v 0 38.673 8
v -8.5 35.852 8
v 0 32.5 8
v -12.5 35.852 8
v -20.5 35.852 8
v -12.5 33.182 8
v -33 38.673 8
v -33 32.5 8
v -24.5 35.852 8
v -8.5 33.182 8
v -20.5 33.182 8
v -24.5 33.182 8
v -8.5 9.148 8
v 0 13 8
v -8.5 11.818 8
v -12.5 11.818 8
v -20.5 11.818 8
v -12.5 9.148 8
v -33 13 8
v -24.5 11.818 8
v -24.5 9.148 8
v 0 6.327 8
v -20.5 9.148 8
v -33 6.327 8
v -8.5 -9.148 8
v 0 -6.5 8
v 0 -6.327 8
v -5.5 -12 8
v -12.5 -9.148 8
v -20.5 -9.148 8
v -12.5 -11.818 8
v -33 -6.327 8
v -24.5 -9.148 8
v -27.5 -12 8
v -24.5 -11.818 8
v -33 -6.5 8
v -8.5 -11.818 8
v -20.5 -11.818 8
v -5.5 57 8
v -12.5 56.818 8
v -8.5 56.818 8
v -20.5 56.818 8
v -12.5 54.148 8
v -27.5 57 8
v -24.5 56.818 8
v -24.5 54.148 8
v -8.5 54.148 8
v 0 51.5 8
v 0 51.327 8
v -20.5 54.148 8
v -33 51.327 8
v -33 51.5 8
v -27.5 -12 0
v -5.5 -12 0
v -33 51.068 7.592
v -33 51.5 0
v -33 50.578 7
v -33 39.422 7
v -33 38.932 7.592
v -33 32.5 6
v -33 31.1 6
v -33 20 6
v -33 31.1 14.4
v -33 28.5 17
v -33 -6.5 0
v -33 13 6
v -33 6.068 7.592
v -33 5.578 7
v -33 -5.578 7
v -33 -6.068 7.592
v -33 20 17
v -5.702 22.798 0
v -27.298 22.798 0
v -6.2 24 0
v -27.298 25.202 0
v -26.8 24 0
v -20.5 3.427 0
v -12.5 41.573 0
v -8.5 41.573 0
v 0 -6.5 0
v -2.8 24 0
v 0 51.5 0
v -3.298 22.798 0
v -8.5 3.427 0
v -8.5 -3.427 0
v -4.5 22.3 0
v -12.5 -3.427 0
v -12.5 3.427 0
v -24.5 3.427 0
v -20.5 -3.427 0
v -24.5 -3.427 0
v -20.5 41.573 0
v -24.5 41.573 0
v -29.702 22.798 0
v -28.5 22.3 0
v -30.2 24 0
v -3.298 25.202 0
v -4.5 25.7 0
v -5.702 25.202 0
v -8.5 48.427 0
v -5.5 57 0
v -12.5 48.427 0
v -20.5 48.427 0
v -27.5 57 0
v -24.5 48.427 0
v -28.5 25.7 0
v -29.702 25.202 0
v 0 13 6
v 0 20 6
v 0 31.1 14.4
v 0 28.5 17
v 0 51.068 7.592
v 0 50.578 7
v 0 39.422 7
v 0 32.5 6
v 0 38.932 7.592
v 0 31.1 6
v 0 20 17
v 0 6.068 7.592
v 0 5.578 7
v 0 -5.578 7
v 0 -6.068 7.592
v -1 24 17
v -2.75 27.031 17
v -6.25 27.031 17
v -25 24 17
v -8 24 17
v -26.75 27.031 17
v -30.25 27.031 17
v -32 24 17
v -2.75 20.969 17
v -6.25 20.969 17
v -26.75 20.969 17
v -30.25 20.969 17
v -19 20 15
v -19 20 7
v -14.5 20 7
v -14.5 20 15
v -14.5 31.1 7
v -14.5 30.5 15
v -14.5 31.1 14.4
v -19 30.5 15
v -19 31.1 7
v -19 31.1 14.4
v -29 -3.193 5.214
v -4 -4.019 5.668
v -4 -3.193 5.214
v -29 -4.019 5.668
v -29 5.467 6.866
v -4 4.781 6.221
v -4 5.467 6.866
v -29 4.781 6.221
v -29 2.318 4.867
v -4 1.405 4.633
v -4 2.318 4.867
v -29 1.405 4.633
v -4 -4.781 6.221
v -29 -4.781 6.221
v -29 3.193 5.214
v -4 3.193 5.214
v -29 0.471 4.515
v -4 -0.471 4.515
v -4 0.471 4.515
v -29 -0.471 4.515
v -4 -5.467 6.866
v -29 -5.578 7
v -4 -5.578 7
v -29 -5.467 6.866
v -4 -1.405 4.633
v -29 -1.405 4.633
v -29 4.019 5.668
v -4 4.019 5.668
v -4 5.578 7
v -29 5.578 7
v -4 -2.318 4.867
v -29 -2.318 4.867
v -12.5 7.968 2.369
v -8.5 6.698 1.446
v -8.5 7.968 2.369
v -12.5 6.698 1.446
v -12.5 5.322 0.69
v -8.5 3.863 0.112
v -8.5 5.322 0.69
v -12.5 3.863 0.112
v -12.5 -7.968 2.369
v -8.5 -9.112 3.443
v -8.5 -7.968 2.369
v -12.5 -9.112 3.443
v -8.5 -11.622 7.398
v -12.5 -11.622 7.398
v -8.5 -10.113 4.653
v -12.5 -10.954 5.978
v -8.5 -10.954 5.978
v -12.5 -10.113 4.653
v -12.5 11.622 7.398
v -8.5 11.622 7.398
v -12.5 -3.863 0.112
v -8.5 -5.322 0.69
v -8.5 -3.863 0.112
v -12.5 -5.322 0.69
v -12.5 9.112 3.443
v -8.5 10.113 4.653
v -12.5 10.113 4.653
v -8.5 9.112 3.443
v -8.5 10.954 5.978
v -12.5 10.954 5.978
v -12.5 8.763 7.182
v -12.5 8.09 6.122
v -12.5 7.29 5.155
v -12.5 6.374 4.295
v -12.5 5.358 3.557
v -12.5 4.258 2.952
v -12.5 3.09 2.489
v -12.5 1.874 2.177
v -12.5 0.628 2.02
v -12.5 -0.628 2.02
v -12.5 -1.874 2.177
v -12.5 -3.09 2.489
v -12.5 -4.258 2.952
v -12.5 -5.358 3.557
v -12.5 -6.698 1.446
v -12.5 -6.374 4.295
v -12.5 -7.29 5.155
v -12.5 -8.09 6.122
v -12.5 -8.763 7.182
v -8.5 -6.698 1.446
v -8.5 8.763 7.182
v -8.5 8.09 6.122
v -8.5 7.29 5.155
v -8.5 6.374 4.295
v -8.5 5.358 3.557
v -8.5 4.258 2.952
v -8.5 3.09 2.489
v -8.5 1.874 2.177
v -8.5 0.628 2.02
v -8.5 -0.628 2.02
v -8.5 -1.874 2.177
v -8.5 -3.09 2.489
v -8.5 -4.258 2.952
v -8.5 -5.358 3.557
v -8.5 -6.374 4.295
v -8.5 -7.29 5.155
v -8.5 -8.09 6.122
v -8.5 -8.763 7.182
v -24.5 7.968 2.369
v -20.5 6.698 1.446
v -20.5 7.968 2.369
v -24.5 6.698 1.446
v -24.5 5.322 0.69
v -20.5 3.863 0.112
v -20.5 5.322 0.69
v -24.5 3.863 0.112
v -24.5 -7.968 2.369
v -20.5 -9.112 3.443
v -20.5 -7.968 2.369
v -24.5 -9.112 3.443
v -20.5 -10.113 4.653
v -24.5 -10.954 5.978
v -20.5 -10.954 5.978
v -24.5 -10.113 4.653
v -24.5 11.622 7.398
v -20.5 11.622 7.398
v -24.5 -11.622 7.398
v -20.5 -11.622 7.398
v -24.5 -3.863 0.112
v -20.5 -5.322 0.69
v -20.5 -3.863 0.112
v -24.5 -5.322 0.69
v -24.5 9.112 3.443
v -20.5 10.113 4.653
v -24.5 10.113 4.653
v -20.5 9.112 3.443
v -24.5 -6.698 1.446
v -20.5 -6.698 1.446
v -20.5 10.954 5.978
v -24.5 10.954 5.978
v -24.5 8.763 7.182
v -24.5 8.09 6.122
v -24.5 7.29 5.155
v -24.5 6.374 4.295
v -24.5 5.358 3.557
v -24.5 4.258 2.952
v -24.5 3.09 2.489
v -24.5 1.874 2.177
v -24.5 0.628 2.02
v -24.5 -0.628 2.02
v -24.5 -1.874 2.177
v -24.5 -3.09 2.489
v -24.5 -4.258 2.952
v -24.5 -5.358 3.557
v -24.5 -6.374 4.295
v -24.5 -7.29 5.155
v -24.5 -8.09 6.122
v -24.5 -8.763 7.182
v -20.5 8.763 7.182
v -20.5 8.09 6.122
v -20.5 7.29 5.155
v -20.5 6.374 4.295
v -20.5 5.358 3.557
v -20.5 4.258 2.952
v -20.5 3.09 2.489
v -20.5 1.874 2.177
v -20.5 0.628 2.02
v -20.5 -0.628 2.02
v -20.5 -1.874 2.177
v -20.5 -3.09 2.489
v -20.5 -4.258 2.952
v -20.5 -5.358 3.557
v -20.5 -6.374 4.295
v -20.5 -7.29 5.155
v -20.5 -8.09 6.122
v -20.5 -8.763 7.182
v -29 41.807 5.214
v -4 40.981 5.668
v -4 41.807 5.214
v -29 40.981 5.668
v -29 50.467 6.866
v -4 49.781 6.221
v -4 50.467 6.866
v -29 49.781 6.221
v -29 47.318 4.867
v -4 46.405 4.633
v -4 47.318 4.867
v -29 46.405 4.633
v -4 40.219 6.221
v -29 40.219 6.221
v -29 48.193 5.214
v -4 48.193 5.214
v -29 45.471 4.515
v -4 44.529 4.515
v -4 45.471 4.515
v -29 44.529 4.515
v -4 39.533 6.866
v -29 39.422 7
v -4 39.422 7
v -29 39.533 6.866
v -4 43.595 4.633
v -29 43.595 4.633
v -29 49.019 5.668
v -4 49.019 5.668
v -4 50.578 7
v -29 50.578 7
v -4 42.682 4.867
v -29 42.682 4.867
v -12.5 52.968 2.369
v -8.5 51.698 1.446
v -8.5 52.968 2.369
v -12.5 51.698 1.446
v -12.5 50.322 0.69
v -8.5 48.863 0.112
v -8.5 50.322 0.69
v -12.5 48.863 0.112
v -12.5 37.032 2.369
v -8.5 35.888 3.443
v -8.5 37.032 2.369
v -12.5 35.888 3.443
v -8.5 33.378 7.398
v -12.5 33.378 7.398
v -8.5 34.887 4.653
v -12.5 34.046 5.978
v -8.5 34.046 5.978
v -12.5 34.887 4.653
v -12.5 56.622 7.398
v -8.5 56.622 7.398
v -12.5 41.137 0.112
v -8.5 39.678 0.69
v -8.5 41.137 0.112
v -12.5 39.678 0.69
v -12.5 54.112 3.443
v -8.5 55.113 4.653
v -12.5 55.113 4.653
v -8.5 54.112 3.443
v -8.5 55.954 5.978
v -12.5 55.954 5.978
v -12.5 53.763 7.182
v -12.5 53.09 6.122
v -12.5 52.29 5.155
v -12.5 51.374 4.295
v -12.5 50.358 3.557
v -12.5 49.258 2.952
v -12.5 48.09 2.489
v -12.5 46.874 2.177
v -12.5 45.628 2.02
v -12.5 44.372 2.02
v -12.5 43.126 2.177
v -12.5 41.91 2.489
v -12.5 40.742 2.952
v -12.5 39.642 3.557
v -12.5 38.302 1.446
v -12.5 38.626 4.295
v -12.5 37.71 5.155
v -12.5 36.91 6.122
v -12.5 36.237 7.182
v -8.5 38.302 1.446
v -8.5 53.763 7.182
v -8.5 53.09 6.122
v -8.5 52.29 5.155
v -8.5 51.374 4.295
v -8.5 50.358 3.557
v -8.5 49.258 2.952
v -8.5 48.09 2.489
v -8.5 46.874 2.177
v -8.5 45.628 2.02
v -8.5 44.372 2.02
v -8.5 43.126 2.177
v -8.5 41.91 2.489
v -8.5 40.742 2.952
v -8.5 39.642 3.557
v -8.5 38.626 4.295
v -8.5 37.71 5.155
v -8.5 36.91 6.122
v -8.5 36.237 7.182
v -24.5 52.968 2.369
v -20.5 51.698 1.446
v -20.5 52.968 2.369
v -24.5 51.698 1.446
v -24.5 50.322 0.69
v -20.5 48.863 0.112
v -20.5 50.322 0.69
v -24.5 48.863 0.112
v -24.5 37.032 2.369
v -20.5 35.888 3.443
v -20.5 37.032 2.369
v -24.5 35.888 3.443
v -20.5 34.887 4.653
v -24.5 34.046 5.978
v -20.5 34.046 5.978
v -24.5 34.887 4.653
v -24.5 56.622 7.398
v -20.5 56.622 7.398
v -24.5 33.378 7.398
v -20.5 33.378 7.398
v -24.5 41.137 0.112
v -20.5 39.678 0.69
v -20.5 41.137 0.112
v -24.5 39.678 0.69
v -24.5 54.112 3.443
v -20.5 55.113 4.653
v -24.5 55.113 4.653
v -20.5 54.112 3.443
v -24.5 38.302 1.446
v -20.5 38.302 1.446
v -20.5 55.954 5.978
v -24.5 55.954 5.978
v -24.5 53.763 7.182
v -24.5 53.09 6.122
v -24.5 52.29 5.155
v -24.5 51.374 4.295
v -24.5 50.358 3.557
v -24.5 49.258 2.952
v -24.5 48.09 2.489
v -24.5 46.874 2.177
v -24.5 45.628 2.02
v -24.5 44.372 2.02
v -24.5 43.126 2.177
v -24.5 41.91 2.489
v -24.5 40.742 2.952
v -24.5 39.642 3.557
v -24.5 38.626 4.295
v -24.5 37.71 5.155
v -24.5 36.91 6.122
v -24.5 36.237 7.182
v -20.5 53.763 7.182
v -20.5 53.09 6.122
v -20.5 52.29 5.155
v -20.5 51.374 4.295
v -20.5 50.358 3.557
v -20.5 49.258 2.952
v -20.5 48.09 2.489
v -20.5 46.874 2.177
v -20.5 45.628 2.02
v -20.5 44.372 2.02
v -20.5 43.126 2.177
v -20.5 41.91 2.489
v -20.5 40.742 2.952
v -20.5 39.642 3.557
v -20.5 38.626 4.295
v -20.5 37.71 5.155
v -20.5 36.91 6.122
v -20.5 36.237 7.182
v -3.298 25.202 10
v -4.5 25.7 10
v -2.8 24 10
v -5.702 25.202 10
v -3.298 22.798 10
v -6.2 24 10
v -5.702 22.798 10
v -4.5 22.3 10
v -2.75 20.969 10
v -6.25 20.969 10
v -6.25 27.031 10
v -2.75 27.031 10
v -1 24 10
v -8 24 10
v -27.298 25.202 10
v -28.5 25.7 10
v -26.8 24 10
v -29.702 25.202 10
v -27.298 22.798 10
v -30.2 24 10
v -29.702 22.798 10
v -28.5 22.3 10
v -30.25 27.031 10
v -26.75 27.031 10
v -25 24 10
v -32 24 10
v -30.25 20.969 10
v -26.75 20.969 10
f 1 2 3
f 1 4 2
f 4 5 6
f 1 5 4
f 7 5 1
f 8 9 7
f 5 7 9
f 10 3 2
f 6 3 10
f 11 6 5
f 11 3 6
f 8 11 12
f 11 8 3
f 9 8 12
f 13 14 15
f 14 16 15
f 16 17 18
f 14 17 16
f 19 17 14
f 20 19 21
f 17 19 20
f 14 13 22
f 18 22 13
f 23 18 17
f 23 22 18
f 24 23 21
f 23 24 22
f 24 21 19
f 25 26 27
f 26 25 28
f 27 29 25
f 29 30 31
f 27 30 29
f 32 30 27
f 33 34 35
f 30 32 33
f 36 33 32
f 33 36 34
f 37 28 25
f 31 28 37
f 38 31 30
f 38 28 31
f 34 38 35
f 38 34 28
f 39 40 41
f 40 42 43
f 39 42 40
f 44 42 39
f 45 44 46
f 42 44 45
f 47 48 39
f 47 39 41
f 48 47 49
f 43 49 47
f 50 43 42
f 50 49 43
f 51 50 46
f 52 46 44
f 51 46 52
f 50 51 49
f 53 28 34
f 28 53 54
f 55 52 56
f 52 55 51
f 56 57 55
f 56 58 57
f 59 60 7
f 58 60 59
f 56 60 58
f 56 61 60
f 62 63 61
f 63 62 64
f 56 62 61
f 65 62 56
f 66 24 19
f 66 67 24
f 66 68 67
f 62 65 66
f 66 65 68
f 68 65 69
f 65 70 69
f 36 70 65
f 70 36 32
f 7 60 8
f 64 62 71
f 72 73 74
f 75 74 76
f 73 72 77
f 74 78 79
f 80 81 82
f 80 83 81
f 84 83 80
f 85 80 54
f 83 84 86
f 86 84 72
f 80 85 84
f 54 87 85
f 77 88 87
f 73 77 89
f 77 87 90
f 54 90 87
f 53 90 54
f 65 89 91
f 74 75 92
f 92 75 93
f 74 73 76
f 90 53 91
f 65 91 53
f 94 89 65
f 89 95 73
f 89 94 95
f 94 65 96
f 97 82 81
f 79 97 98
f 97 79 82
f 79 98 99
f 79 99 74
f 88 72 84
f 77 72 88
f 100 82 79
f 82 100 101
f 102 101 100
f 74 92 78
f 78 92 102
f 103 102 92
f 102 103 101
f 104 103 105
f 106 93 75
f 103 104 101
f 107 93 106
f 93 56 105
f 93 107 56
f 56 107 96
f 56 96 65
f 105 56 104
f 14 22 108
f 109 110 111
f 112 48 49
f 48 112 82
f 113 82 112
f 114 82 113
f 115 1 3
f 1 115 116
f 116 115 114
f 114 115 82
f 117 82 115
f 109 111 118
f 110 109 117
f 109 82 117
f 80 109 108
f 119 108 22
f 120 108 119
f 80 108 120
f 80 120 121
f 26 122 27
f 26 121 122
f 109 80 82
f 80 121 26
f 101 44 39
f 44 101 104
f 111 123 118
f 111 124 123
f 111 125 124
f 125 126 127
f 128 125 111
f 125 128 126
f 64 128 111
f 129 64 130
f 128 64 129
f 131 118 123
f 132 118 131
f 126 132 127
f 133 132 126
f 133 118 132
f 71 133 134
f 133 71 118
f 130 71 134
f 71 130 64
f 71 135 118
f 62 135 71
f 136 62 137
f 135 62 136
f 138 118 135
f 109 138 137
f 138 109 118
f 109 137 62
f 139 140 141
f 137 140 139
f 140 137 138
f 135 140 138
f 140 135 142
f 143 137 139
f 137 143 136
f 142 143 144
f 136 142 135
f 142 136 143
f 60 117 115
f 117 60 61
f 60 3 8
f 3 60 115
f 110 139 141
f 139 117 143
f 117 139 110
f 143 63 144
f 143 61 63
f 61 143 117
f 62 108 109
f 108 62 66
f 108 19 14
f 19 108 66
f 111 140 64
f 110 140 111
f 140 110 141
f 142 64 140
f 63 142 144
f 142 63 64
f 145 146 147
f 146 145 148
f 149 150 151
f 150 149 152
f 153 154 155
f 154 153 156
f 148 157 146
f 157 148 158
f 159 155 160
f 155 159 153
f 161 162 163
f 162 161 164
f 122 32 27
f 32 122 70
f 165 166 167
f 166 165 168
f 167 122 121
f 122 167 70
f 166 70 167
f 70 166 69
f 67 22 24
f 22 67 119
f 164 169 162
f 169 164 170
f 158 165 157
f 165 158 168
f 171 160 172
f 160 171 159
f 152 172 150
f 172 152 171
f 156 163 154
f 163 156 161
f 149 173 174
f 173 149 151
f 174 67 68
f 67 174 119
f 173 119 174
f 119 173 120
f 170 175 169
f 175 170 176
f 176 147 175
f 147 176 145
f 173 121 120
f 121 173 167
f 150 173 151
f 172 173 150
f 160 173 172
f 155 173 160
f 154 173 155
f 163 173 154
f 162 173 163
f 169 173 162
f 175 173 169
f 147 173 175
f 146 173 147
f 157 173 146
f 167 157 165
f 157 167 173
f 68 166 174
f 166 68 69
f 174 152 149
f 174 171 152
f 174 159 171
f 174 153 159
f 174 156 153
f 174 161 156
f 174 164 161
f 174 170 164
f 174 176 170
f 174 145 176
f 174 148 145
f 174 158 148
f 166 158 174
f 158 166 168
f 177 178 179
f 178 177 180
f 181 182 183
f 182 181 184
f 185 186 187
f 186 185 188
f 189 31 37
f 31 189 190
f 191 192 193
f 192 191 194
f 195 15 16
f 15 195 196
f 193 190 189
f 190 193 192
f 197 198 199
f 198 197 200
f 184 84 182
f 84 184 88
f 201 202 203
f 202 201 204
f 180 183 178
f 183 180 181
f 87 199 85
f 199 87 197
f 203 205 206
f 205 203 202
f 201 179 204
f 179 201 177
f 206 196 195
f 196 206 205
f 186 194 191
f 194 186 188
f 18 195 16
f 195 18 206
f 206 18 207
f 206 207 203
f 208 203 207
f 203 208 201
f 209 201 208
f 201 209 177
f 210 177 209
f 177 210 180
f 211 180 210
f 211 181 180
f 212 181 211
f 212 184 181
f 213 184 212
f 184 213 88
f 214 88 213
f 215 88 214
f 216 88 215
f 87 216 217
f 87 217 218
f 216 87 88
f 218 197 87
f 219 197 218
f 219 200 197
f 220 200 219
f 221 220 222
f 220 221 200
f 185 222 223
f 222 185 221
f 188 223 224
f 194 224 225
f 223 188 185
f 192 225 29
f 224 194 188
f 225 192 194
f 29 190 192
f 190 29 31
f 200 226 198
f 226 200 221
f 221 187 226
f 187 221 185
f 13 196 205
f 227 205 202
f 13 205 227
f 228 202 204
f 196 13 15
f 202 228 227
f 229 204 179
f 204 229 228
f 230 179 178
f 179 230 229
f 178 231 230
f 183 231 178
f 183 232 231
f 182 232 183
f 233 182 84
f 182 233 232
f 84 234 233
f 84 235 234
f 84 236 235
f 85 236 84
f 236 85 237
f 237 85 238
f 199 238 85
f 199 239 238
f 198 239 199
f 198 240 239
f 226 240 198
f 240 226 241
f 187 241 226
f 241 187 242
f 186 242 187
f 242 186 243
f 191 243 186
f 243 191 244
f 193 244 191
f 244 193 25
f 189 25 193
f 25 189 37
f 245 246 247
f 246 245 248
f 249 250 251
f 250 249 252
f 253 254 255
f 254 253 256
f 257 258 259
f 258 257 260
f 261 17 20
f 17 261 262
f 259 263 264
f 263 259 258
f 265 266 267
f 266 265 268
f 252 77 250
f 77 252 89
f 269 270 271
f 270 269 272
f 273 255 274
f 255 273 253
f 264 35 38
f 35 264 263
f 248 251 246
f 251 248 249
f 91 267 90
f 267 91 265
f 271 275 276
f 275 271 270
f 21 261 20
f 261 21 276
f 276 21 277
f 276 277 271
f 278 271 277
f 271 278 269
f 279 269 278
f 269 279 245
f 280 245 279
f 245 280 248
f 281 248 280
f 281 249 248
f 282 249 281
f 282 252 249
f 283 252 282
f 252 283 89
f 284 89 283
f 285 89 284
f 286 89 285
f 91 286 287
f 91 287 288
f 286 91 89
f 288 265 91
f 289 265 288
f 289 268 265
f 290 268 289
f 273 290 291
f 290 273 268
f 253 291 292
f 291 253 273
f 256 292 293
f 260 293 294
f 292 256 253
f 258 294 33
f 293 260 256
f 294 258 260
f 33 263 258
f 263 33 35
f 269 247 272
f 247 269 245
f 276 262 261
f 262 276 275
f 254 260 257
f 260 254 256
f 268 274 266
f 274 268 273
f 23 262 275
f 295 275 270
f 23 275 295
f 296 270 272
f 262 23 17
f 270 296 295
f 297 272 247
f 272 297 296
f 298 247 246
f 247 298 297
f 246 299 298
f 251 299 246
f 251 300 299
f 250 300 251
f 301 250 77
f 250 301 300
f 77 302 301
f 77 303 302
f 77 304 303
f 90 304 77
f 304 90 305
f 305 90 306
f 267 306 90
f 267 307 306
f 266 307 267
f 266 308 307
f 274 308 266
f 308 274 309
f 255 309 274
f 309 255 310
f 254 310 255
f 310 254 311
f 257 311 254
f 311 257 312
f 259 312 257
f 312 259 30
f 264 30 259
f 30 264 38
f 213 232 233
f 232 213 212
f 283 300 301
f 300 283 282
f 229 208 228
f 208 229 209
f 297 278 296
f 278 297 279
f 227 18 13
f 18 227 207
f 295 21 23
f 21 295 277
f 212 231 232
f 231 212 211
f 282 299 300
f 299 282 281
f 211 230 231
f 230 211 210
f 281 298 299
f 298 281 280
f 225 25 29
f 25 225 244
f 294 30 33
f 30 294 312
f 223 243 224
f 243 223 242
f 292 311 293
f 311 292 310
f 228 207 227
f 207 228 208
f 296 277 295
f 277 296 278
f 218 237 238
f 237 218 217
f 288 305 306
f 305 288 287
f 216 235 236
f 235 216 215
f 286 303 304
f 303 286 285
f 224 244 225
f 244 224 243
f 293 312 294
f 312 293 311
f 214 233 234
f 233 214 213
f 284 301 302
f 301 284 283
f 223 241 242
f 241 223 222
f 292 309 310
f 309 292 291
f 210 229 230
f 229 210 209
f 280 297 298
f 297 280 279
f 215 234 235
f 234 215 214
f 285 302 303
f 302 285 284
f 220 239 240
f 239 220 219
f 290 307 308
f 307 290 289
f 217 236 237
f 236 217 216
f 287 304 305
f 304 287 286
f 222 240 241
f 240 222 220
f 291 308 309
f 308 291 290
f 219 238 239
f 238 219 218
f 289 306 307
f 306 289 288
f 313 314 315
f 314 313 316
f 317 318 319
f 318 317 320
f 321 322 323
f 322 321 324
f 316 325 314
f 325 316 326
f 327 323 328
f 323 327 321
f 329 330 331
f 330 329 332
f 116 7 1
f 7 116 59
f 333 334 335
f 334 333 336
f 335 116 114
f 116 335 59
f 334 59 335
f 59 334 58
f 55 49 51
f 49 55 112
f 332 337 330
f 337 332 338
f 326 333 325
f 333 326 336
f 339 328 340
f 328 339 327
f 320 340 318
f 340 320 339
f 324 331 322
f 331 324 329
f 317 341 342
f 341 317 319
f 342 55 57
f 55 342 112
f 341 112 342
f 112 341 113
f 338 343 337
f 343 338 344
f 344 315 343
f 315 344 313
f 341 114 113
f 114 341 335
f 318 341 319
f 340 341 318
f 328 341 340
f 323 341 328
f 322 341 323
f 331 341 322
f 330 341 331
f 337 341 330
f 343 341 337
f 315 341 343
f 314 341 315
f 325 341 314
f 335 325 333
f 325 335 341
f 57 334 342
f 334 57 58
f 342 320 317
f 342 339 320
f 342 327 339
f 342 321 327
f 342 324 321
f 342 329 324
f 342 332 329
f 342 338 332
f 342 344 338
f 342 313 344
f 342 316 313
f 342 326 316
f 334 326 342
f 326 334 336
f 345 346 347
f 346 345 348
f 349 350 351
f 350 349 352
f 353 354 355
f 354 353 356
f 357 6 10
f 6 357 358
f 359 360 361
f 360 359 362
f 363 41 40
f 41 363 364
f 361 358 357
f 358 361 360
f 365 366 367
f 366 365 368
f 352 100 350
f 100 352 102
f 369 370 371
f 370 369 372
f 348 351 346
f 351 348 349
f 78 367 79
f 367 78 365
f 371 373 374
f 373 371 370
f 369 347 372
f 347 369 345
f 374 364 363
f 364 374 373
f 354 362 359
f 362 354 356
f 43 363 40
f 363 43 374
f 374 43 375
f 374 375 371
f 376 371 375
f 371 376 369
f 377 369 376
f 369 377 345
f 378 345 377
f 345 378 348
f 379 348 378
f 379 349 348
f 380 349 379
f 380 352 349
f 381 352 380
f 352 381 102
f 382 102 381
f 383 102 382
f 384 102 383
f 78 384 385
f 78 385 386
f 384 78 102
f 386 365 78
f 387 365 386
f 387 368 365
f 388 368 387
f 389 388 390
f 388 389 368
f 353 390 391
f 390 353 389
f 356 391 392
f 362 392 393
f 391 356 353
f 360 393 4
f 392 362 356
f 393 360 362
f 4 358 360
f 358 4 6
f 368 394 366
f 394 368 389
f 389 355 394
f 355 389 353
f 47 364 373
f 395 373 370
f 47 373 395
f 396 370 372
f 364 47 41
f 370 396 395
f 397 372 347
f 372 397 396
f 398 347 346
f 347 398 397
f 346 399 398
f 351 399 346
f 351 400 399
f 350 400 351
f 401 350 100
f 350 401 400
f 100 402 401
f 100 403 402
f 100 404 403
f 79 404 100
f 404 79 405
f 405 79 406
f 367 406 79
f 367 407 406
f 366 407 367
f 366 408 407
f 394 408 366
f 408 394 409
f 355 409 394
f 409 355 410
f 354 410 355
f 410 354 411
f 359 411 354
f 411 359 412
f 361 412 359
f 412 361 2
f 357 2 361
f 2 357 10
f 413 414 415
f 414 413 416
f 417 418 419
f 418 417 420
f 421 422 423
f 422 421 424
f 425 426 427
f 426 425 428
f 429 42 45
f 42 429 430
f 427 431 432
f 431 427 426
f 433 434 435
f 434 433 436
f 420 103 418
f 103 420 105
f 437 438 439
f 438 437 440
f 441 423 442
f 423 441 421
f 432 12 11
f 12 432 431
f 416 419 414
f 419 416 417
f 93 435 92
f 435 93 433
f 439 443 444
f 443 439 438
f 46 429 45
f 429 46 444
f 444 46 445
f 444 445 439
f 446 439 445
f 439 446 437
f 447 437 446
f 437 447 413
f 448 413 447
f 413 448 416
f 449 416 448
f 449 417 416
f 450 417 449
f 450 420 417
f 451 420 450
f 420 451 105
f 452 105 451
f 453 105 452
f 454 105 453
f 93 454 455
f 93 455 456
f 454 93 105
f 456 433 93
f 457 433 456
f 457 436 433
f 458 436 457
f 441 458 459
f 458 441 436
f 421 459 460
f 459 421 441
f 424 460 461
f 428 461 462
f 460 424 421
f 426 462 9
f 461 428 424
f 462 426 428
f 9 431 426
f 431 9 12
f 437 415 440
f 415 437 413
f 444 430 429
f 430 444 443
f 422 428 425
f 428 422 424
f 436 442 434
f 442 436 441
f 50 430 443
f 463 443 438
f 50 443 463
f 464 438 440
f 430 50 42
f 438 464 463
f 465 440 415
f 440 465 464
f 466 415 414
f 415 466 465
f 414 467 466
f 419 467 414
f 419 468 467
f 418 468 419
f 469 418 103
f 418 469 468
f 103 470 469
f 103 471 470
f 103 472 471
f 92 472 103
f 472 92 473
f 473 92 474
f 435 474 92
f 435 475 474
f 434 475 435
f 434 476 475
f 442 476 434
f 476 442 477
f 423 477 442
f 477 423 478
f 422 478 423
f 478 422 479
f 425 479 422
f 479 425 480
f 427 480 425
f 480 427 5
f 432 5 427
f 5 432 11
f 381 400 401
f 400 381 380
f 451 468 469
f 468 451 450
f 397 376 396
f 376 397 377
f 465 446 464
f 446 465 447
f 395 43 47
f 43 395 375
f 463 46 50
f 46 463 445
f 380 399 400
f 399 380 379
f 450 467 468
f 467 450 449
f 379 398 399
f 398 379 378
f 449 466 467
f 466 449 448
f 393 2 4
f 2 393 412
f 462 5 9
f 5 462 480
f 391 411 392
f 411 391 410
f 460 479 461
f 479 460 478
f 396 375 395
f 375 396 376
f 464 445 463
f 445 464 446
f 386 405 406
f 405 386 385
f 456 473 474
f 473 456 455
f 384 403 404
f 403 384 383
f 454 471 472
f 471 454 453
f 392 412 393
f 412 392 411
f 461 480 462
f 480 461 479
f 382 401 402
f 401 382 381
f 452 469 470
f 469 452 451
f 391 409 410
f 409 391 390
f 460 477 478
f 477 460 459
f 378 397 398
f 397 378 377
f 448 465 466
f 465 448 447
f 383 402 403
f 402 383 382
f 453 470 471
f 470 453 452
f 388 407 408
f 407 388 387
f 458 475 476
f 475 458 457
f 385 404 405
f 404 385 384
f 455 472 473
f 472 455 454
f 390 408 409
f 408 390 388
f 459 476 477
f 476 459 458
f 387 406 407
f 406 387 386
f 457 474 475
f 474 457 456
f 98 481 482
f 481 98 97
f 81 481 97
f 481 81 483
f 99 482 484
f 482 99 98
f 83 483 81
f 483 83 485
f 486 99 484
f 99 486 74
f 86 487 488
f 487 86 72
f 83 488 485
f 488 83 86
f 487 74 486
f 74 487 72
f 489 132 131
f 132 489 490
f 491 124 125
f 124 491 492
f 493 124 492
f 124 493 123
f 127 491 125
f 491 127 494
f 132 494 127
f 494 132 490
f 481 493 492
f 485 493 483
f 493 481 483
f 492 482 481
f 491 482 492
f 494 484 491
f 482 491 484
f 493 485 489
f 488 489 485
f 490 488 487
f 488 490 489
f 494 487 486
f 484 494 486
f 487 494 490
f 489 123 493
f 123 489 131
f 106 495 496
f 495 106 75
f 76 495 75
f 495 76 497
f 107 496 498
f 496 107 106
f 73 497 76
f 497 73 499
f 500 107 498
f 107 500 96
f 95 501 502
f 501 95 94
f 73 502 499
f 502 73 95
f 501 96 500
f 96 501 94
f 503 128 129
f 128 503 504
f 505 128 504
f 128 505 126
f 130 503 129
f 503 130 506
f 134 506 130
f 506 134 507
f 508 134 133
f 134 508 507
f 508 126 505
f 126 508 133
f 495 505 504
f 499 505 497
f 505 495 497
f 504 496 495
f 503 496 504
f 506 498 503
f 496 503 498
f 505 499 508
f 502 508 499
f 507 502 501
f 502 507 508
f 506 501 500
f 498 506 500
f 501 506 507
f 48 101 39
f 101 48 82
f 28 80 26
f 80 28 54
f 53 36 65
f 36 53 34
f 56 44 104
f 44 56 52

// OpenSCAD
// file: inc/bearing.scad
// PRUSA iteration3
// Bearing holders
// GNU GPL v3
// Josef Průša <iam@josefprusa.cz> and contributors
// http://www.reprap.org/wiki/Prusa_Mendel
// http://prusamendel.org

bearing_diameter = 15;

module horizontal_bearing_base(bearings=1){
 translate(v=[0,0,8/2]) cube(size = [24,8+bearings*25,8], center = true);	
}
module horizontal_bearing_holes(bearings=1){
 cutter_lenght = 10+bearings*25;
 one_holder_lenght = 8+25;
 holder_lenght = 8+bearings*25;
 
 // Main bearing cut
 difference(){
  translate(v=[0,0,12]) rotate(a=[90,0,0]) translate(v=[0,0,-cutter_lenght/2]) cylinder(h = cutter_lenght, r=bearing_diameter/2, $fn=50);
  // Bearing retainers
  translate(v=[0,1-holder_lenght/2,3]) cube(size = [24,6,8], center = true);
  translate(v=[0,-1+holder_lenght/2,3]) cube(size = [24,6,8], center = true);
 }
 
 // Ziptie cutouts
 ziptie_cut_ofset = 0;
 for ( i = [0 : bearings-1] ){
  // For easier positioning I move them by half of one 
  // bearing holder then add each bearign lenght and then center again
  translate(v=[0,-holder_lenght/2,0]) translate(v=[0,one_holder_lenght/2+i*25,0]) difference(){
   union(){
    translate(v=[0,2-6,12]) rotate(a=[90,0,0]) translate(v=[0,0,0]) cylinder(h = 4, r=12.5, $fn=50);
    translate(v=[0,2+6,12]) rotate(a=[90,0,0]) translate(v=[0,0,0]) cylinder(h = 4, r=12.5, $fn=50);
   }
   translate(v=[0,10,12]) rotate(a=[90,0,0]) translate(v=[0,0,0]) cylinder(h = 24, r=10, $fn=50);
  }
 }
 
}

*difference() {
horizontal_bearing_base();
horizontal_bearing_holes();
}

module horizontal_bearing_test(){
 difference(){
  horizontal_bearing_base(1);
  horizontal_bearing_holes(1);
 }
 translate(v=[30,0,0]) difference(){
  horizontal_bearing_base(2);
  horizontal_bearing_holes(2);
 }
 translate(v=[60,0,0]) difference(){
  horizontal_bearing_base(3);
  horizontal_bearing_holes(3);
 }
}


vertical_bearing_height = 50;

thinwall = 2;
bearing_size = bearing_diameter + 2 * thinwall;

module vertical_bearing_base(){
 translate(v=[-2-bearing_size/4,0,vertical_bearing_height/2]) cube(size = [4+bearing_size/2,bearing_size,vertical_bearing_height], center = true);
 cylinder(h = vertical_bearing_height, r=bearing_size/2, $fn = 60);
}

module vertical_bearing_holes(){
  translate(v=[0,0,-1]) cylinder(h = vertical_bearing_height+10, r=bearing_diameter/2, $fn = 60);
  rotate(a=[0,0,-60]) translate(v=[10,0,vertical_bearing_height/2+1]) cube(size = [10,1,vertical_bearing_height+2], center = true);
}

difference(){
vertical_bearing_base();
vertical_bearing_holes();
}
// file: ../configuration.scad
x_rod_distance = 45;

layer_height = 0.3;
layer_width = 2.2 * layer_height;

// Select your belt type ******************************************************

//T2.5
//belt_tooth_distance = 2.5;
//belt_tooth_ratio = 0.5;

//GT2
belt_tooth_distance = 2;
belt_tooth_ratio = 0.5;

//T5 (strongly discouraged)
//belt_tooth_distance = 5;
//belt_tooth_ratio = 0.75;

//HTD3
//belt_tooth_distance = 3;
//belt_tooth_ratio = 0.75;

//MXL
//belt_tooth_distance = 2.032;
//belt_tooth_ratio = 0.64;

// Select your bearing type ******************************************************

// 0 = 608, 1 = 624
bearing_x_idler = 0;
bearing_y_idler = 0;

// Select your hot-end mount ******************************************************

// 0 = none; 1 = groove-mount (J-head/MakerGear etc.)
hotend_mount = 1;

hotend_groovemount_depth = 5;
hotend_groovemount_diameter = 16;
// main file
// PRUSA iteration3
// X carriage
// GNU GPL v3
// Josef Průša <iam@josefprusa.cz> and contributors
// http://www.reprap.org/wiki/Prusa_Mendel
// http://prusamendel.org

include <../configuration.scad>
use <inc/bearing.scad>

module x_carriage_base() {
 // Small bearing holder
 translate([-33/2,0,0]) rotate([0,0,90]) horizontal_bearing_base(1);
 // Long bearing holder
 translate([-33/2,x_rod_distance,0]) rotate([0,0,90]) horizontal_bearing_base(1);
 // Base plate
 translate([-33,-11.5,0]) cube([33,68,8]);
 // Belt holder base
 translate([-33,20,0]) cube([33,12,17]);
}

module x_carriage_beltcut() {
 // Cut in the middle for belt
 translate([-2.5-16.5,19,7]) cube([4.5,13,8]);
 // Cut clearing space for the belt
 *translate([-38,5,7]) cube([40,13,15]);
 // Belt slit
 translate([-66,21.5+10-0.4,6]) cube([67,1.4,15]);
 translate([-66,21.5-8.5,6]) cube([67,7,15]);
 // Smooth entrance
 translate([-66,21.5+10,14]) rotate([45,0,0]) cube([67,15,15]);
}

module x_carriage_holes() {
 // Small bearing holder holes cutter
 translate([-33/2,0,0]) rotate([0,0,90]) horizontal_bearing_holes(1);
 // Long bearing holder holes cutter
 translate([-33/2,x_rod_distance,0]) rotate([0,0,90]) horizontal_bearing_holes(1);
  // Extruder mounting holes
  translate([-16.5+12,24,-1])cylinder(r=1.7, h=20, $fn=8);
  translate([-16.5+12,24,10])cylinder(r=3.5, h=20, $fn=6); 
  translate([-16.5-12,24,-1])cylinder(r=1.7, h=20, $fn=8);
  translate([-16.5-12,24,10])cylinder(r=3.5, h=20, $fn=6); 	
}

module x_carriage_fancy() {
 // Top right corner
 translate([0,-5,0]) translate([0,45+11.5,-1]) rotate([0,0,45]) translate([0,-15,0]) cube([30,30,20]);
 // Bottom right corner
 translate([0,5,0]) translate([0,-11.5,-1]) rotate([0,0,-45]) translate([0,-15,0]) cube([30,30,20]);
 // Bottom ĺeft corner
 translate([-33,5,0]) translate([0,-11.5,-1]) rotate([0,0,-135]) translate([0,-15,0]) cube([30,30,20]);
 // Top left corner
 translate([-33,-5,0]) translate([0,45+11.5,-1]) rotate([0,0,135]) translate([0,-15,0]) cube([30,30,20]);	
}

// Final part
module x_carriage() {
 difference() {
  x_carriage_base();
  x_carriage_beltcut();
  x_carriage_holes();
  x_carriage_fancy();
 }
}

x_carriage();
